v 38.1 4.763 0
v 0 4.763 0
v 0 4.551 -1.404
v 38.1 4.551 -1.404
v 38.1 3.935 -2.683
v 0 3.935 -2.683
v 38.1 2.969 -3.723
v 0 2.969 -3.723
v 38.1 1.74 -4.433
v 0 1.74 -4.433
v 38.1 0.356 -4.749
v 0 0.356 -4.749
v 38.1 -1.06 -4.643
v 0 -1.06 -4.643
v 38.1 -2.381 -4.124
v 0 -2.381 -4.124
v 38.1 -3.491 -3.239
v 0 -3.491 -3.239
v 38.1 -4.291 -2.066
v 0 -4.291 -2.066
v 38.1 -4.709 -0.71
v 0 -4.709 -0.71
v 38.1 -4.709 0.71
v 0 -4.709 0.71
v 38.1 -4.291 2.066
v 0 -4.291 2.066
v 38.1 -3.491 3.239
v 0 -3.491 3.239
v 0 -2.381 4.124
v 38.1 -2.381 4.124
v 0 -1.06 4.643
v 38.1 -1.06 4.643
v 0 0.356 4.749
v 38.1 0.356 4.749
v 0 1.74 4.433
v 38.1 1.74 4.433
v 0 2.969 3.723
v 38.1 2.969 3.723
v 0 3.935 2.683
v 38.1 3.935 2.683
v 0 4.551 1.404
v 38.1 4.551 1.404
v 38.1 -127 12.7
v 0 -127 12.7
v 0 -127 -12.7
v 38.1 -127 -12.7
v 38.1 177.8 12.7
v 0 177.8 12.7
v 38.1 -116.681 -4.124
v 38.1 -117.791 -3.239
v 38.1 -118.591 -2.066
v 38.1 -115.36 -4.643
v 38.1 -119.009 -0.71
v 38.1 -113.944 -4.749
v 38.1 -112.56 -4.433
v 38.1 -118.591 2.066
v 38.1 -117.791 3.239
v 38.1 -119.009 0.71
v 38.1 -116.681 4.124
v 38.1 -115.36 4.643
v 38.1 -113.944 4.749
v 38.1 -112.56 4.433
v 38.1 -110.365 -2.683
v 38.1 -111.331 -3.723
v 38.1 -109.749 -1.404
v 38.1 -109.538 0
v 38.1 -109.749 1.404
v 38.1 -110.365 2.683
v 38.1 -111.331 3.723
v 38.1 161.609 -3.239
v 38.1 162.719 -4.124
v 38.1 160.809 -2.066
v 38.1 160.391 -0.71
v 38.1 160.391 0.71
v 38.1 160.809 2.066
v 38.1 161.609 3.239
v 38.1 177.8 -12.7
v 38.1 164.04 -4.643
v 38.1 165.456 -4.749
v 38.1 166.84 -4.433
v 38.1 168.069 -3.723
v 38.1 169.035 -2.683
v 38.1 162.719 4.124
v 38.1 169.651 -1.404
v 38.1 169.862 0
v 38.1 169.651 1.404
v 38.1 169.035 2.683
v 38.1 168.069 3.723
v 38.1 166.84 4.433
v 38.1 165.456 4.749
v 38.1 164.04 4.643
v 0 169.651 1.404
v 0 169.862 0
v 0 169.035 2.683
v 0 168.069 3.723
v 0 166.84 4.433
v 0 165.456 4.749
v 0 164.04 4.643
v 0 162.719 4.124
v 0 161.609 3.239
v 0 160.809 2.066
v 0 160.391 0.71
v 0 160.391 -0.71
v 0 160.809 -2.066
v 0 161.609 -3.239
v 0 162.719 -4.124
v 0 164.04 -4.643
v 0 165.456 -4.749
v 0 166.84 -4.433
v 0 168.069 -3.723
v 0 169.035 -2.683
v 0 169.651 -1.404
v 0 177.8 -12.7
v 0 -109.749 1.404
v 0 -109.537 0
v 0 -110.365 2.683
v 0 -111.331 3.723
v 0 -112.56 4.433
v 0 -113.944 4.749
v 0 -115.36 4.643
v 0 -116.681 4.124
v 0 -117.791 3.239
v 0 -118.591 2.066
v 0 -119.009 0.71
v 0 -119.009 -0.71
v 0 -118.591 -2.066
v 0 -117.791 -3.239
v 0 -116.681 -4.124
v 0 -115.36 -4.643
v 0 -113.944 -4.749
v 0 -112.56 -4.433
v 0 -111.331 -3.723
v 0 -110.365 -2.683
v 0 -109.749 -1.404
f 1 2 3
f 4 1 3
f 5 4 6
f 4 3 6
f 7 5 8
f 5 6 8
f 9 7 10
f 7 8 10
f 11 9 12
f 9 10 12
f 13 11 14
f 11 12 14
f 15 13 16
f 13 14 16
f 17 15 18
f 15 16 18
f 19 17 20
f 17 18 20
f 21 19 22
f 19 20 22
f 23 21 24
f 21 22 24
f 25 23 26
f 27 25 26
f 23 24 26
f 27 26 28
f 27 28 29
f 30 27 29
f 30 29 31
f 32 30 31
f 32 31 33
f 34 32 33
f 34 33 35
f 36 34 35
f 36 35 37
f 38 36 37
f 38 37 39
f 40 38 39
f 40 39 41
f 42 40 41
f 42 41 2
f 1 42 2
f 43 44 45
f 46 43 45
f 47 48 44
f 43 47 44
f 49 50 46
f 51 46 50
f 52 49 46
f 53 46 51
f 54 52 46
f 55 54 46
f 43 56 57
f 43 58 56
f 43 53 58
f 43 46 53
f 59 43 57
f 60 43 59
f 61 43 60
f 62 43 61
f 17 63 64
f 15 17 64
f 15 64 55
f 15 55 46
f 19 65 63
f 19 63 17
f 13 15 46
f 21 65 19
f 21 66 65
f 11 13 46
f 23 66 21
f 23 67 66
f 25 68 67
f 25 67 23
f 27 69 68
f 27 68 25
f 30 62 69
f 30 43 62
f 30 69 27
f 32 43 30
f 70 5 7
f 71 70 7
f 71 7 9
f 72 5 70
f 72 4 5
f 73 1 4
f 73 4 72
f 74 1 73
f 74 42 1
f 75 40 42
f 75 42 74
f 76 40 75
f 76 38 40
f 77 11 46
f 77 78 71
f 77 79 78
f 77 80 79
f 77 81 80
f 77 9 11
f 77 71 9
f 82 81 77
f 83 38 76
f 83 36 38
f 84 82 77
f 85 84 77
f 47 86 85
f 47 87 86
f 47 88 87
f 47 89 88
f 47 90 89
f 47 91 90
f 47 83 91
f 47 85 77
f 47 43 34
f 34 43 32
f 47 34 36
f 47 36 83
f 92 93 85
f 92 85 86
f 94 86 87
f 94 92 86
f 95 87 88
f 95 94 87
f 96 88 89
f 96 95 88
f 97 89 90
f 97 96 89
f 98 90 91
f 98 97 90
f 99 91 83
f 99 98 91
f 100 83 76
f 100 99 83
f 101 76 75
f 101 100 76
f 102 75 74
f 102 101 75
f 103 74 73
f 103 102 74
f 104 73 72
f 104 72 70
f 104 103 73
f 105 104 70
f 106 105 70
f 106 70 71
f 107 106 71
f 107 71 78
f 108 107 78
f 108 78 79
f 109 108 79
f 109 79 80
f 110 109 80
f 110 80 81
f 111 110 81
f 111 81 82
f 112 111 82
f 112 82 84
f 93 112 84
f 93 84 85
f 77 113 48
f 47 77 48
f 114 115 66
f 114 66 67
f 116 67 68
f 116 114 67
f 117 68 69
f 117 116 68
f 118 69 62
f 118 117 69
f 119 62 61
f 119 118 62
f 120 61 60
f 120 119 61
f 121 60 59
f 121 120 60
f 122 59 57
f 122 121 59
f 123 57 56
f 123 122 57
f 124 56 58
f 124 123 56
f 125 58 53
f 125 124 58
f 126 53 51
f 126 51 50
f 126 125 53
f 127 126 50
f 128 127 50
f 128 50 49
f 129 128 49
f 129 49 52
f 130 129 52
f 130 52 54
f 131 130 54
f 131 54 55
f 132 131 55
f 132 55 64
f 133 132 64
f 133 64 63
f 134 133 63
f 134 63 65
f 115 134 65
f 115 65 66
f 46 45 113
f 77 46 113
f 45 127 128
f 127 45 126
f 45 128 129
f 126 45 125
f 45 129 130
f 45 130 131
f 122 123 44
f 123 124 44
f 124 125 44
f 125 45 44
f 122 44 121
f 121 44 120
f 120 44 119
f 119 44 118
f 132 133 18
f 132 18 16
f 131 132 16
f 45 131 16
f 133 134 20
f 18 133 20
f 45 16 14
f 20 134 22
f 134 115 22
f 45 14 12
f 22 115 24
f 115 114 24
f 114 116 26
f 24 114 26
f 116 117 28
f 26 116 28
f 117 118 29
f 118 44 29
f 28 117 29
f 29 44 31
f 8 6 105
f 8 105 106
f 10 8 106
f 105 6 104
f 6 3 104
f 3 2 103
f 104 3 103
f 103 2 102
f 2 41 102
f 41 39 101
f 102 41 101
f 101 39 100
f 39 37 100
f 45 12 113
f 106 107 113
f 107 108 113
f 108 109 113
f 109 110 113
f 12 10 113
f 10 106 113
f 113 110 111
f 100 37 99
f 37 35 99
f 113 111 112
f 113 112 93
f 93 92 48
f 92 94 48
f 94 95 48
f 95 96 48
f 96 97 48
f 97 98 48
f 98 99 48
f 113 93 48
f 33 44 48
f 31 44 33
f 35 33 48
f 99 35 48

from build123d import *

# Parameters (mm, degrees)
F0_R     = 4.7625
F1_DEPTH = 38.1
F2_DEPTH = 25.4


with BuildPart() as f1:
    # F0 (on Right) → F1 (new body)
    with BuildSketch(Plane.YZ):
        with BuildLine():
            Line((0, 12.7), (-127, 12.7))
            Line((-127, 12.7), (-127, -12.7))
            Line((-127, -12.7), (0, -12.7))
            Line((0, -12.7), (0, -4.7625))
            ThreePointArc((0, -4.7625), (-4.7625, 0), (0, 4.7625))
            Line((0, 4.7625), (0, 12.7))
        make_face()
        with Locations((-114.3, 0)):
            Circle(F0_R, mode=Mode.SUBTRACT)
        with BuildLine():
            Line((177.8, 12.7), (0, 12.7))
            Line((0, 12.7), (0, 4.7625))
            ThreePointArc((0, 4.7625), (3.3675960454, 3.3675960454), (4.7625, 0))
            ThreePointArc((4.7625, 0), (3.3675960454, -3.3675960454), (0, -4.7625))
            Line((0, -4.7625), (0, -12.7))
            Line((0, -12.7), (177.8, -12.7))
            Line((177.8, -12.7), (177.8, 12.7))
        make_face()
        with Locations((165.1, 0)):
            Circle(F0_R, mode=Mode.SUBTRACT)
    extrude(amount=F1_DEPTH)

    # F0 (on Right) → F2 (join)
    with BuildSketch(Plane.YZ):
        with BuildLine():
            Line((0, 12.7), (-127, 12.7))
            Line((-127, 12.7), (-127, -12.7))
            Line((-127, -12.7), (0, -12.7))
            Line((0, -12.7), (0, -4.7625))
            ThreePointArc((0, -4.7625), (-4.7625, 0), (0, 4.7625))
            Line((0, 4.7625), (0, 12.7))
        make_face()
        with Locations((-114.3, 0)):
            Circle(F0_R, mode=Mode.SUBTRACT)
        with BuildLine():
            Line((177.8, 12.7), (0, 12.7))
            Line((0, 12.7), (0, 4.7625))
            ThreePointArc((0, 4.7625), (3.3675960454, 3.3675960454), (4.7625, 0))
            ThreePointArc((4.7625, 0), (3.3675960454, -3.3675960454), (0, -4.7625))
            Line((0, -4.7625), (0, -12.7))
            Line((0, -12.7), (177.8, -12.7))
            Line((177.8, -12.7), (177.8, 12.7))
        make_face()
        with Locations((165.1, 0)):
            Circle(F0_R, mode=Mode.SUBTRACT)
    extrude(amount=F2_DEPTH)


solid = f1.part
